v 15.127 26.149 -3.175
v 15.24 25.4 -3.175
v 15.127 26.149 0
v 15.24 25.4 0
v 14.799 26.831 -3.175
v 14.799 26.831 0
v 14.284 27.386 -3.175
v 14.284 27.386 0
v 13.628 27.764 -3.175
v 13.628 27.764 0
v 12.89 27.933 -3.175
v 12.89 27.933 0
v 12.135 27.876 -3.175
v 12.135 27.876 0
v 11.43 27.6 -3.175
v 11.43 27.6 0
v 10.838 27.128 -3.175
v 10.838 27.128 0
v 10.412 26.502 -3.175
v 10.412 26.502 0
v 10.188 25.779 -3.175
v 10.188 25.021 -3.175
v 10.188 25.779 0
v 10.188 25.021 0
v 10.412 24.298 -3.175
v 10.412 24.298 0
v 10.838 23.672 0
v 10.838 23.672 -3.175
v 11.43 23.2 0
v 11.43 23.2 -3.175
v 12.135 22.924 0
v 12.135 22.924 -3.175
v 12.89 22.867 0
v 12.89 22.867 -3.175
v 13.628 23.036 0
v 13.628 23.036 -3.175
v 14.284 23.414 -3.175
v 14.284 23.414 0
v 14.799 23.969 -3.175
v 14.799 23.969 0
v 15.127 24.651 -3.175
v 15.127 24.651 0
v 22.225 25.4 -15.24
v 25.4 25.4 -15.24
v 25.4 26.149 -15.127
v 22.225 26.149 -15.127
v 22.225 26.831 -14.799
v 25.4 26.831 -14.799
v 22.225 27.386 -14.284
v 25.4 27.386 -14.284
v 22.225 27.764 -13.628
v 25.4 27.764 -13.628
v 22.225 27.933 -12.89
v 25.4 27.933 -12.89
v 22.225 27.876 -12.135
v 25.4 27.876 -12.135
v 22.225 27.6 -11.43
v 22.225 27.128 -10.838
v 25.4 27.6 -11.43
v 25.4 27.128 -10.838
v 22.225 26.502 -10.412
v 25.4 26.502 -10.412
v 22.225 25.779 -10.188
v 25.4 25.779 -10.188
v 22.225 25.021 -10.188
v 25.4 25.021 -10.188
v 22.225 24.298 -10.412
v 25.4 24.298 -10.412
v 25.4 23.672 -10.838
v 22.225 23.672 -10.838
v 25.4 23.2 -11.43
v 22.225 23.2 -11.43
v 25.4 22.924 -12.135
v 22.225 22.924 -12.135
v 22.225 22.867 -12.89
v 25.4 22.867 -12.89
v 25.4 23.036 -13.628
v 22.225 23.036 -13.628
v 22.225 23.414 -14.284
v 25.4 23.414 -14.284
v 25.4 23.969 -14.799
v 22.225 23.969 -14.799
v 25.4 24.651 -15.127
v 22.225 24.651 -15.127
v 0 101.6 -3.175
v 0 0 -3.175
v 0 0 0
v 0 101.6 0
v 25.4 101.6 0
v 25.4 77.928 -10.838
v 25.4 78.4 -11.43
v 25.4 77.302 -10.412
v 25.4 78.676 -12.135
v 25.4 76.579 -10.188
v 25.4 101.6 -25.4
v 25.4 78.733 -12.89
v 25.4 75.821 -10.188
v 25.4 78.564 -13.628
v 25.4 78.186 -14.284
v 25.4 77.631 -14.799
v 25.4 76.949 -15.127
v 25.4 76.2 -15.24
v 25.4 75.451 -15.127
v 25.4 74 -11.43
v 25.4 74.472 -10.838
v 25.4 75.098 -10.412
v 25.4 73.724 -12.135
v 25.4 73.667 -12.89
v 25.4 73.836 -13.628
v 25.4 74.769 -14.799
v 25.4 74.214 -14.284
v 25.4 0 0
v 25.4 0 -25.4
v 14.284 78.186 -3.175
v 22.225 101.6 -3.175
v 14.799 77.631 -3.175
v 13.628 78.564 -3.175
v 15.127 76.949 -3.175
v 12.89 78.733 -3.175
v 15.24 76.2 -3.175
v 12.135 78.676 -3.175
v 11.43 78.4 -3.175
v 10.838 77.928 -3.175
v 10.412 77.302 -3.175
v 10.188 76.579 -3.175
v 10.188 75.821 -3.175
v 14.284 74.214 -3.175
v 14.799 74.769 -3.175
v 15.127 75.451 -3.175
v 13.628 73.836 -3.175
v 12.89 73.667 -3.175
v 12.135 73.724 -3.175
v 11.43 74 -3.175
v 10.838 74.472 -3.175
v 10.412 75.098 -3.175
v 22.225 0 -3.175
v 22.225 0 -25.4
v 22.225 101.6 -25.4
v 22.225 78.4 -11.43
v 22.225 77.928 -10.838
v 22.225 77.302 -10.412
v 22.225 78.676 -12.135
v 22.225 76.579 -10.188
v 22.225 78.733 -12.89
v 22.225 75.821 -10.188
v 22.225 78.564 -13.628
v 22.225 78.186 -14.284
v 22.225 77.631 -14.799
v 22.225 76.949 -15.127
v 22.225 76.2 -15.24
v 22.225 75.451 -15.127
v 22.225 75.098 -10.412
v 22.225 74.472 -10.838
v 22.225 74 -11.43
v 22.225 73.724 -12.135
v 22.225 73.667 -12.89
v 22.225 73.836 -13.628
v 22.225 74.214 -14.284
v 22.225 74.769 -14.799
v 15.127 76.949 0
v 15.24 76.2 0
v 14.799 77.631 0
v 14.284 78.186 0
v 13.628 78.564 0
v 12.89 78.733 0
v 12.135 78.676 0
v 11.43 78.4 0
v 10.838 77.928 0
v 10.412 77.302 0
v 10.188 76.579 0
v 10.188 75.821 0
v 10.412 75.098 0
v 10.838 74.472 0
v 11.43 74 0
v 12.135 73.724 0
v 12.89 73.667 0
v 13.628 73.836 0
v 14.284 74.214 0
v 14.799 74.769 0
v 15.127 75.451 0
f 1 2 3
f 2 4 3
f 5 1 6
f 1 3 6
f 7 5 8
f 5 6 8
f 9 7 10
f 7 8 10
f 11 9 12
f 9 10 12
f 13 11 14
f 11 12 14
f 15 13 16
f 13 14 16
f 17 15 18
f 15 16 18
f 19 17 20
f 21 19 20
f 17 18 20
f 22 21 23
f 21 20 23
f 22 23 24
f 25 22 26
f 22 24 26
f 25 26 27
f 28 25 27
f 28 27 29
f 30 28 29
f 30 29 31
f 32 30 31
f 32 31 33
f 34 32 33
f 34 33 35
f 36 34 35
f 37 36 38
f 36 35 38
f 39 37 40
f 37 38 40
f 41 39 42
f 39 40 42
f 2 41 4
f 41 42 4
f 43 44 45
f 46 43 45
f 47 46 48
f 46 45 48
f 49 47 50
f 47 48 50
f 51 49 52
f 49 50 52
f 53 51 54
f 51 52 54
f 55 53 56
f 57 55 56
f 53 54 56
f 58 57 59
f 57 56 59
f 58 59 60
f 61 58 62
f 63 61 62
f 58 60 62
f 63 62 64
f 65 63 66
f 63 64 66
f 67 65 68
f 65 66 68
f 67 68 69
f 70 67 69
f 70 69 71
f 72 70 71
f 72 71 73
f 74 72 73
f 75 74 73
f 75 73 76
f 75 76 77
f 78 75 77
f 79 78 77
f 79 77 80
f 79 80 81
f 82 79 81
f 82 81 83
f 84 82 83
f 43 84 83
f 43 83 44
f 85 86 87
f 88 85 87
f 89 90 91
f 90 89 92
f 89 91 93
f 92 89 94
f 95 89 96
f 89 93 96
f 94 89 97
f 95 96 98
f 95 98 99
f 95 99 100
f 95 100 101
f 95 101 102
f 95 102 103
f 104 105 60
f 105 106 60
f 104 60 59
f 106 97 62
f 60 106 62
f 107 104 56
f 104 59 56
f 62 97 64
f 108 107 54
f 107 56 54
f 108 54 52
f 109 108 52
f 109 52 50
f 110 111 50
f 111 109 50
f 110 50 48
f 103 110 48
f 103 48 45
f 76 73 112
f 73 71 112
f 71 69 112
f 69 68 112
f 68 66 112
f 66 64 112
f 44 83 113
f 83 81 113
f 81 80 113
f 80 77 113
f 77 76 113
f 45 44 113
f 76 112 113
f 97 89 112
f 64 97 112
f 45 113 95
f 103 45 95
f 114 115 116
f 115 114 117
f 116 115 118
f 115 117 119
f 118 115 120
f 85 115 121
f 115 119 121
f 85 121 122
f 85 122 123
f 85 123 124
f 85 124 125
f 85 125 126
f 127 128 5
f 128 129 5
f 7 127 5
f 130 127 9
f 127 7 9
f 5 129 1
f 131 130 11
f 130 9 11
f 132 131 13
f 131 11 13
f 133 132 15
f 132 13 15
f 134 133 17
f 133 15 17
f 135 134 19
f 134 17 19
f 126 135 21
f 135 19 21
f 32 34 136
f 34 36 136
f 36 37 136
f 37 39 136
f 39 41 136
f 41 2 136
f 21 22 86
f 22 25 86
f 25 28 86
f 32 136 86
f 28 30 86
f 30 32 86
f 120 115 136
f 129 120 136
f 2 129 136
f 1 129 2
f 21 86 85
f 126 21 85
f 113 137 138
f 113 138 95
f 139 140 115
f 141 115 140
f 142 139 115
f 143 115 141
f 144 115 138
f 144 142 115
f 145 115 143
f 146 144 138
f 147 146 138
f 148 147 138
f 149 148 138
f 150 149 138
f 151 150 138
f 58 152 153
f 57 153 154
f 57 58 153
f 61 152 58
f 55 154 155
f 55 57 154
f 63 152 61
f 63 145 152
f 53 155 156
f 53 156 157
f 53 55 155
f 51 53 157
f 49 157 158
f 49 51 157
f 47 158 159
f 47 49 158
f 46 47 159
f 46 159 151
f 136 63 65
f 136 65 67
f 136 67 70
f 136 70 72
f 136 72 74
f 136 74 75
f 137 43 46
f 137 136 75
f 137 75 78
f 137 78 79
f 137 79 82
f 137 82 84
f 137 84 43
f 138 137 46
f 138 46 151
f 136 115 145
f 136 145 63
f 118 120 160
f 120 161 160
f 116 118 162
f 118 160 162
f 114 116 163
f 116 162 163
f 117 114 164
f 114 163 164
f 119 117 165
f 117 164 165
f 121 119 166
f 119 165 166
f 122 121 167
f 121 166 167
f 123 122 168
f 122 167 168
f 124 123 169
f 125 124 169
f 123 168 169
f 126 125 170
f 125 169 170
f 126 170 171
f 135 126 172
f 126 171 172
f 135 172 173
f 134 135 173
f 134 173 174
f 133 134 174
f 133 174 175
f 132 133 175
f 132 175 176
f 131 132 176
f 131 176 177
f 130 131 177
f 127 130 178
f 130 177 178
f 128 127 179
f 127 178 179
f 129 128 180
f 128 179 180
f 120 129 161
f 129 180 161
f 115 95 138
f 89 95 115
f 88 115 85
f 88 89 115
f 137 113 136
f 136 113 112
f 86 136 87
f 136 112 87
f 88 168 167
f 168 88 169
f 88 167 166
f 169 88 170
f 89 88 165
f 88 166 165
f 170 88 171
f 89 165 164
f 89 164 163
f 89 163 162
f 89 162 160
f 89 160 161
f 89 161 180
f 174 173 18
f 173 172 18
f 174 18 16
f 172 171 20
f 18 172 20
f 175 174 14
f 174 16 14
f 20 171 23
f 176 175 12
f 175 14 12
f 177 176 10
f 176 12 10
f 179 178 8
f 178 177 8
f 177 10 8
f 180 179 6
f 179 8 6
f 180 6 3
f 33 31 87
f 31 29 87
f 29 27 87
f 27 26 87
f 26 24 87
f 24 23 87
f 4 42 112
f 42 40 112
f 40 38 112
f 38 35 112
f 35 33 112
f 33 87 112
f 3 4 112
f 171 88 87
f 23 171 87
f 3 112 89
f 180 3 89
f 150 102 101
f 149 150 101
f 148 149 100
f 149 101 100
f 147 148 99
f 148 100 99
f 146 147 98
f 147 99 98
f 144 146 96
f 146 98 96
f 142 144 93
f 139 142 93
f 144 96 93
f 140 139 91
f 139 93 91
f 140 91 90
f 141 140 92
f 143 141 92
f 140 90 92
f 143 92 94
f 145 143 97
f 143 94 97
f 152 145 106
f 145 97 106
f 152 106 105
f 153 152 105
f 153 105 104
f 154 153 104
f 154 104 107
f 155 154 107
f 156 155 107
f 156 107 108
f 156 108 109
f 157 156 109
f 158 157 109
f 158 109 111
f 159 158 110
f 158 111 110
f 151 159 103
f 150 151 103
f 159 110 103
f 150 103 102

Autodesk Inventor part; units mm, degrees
ref_plane "YZ Plane" through (0, 0, 0) normal (1, 0, 0) x (0, 1, 0)
ref_plane "XZ Plane" through (0, 0, 0) normal (0, 1, 0) x (-1, 0, 0)
ref_plane "XY Plane" through (0, 0, 0) normal (0, 0, 1) x (1, 0, 0)
sketch "Sketch1" plane through (0, 0, 0) normal (0, 1, 0) x (-1, 0, 0)
  line L0 (0, 0) -> (-25.4, 0)
  line L1 (-25.4, 0) -> (-25.4, -3.175)
  line L2 (-25.4, -3.175) -> (0, -3.175)
  line L3 (0, -3.175) -> (0, 0)
  line L4 (-25.4, 0) -> (-22.225, 0)
  line L5 (-22.225, 0) -> (-22.225, -25.4)
  line L6 (-22.225, -25.4) -> (-25.4, -25.4)
  line L7 (-25.4, -25.4) -> (-25.4, 0)
  dimension "d0" = 25.4
  dimension "d1" = 3.175
  dimension "d2" = 25.4
  dimension "d3" = 3.175
extrude "Extrusion1" add sketch "Sketch1" along normal blind 101.6
sketch "Sketch2" plane through (25.4, 0, 0) normal (1, 0, 0) x (0, 0, -1)
  line L0 (0, 0) -> (0, 101.6) projected
  line L1 (0, 101.6) -> (12.7, 101.6)
  line L2 (25.4, 101.6) -> (3.175, 101.6) projected
  line L3 (12.7, 101.6) -> (12.7, 76.2)
  line L4 (0, 0) -> (12.7, 0)
  line L5 (0, 0) -> (25.4, 0) projected
  line L6 (12.7, 0) -> (12.7, 25.4)
  circle A0 centre (12.7, 76.2) radius 2.54
  circle A1 centre (12.7, 25.4) radius 2.54
  dimension "d6" = 12.7
  dimension "d7" = 25.4
  dimension "d8" = 25.4
  dimension "d9" = 5.08
extrude "Extrusion2" cut sketch "Sketch2" against normal blind 25.4
sketch "Sketch3" plane through (0, 0, 0) normal (0, 0, 1) x (1, 0, 0)
  line L0 (0, 0) -> (0, 101.6) projected
  line L1 (0, 0) -> (12.7, 0)
  line L2 (0, 0) -> (25.4, 0) projected
  line L3 (12.7, 0) -> (12.7, 25.4)
  line L4 (0, 101.6) -> (25.4, 101.6) projected
  line L5 (12.7, 101.6) -> (12.7, 76.2)
  circle A0 centre (12.7, 76.2) radius 2.54
  circle A1 centre (12.7, 25.4) radius 2.54
  dimension "d12" = 25.4
  dimension "d13" = 25.4
  dimension "d14" = 5.08
extrude "Extrusion3" cut sketch "Sketch3" against normal blind 25.4
properties part number "L Bracket 4in" material "Aluminum 6061"
